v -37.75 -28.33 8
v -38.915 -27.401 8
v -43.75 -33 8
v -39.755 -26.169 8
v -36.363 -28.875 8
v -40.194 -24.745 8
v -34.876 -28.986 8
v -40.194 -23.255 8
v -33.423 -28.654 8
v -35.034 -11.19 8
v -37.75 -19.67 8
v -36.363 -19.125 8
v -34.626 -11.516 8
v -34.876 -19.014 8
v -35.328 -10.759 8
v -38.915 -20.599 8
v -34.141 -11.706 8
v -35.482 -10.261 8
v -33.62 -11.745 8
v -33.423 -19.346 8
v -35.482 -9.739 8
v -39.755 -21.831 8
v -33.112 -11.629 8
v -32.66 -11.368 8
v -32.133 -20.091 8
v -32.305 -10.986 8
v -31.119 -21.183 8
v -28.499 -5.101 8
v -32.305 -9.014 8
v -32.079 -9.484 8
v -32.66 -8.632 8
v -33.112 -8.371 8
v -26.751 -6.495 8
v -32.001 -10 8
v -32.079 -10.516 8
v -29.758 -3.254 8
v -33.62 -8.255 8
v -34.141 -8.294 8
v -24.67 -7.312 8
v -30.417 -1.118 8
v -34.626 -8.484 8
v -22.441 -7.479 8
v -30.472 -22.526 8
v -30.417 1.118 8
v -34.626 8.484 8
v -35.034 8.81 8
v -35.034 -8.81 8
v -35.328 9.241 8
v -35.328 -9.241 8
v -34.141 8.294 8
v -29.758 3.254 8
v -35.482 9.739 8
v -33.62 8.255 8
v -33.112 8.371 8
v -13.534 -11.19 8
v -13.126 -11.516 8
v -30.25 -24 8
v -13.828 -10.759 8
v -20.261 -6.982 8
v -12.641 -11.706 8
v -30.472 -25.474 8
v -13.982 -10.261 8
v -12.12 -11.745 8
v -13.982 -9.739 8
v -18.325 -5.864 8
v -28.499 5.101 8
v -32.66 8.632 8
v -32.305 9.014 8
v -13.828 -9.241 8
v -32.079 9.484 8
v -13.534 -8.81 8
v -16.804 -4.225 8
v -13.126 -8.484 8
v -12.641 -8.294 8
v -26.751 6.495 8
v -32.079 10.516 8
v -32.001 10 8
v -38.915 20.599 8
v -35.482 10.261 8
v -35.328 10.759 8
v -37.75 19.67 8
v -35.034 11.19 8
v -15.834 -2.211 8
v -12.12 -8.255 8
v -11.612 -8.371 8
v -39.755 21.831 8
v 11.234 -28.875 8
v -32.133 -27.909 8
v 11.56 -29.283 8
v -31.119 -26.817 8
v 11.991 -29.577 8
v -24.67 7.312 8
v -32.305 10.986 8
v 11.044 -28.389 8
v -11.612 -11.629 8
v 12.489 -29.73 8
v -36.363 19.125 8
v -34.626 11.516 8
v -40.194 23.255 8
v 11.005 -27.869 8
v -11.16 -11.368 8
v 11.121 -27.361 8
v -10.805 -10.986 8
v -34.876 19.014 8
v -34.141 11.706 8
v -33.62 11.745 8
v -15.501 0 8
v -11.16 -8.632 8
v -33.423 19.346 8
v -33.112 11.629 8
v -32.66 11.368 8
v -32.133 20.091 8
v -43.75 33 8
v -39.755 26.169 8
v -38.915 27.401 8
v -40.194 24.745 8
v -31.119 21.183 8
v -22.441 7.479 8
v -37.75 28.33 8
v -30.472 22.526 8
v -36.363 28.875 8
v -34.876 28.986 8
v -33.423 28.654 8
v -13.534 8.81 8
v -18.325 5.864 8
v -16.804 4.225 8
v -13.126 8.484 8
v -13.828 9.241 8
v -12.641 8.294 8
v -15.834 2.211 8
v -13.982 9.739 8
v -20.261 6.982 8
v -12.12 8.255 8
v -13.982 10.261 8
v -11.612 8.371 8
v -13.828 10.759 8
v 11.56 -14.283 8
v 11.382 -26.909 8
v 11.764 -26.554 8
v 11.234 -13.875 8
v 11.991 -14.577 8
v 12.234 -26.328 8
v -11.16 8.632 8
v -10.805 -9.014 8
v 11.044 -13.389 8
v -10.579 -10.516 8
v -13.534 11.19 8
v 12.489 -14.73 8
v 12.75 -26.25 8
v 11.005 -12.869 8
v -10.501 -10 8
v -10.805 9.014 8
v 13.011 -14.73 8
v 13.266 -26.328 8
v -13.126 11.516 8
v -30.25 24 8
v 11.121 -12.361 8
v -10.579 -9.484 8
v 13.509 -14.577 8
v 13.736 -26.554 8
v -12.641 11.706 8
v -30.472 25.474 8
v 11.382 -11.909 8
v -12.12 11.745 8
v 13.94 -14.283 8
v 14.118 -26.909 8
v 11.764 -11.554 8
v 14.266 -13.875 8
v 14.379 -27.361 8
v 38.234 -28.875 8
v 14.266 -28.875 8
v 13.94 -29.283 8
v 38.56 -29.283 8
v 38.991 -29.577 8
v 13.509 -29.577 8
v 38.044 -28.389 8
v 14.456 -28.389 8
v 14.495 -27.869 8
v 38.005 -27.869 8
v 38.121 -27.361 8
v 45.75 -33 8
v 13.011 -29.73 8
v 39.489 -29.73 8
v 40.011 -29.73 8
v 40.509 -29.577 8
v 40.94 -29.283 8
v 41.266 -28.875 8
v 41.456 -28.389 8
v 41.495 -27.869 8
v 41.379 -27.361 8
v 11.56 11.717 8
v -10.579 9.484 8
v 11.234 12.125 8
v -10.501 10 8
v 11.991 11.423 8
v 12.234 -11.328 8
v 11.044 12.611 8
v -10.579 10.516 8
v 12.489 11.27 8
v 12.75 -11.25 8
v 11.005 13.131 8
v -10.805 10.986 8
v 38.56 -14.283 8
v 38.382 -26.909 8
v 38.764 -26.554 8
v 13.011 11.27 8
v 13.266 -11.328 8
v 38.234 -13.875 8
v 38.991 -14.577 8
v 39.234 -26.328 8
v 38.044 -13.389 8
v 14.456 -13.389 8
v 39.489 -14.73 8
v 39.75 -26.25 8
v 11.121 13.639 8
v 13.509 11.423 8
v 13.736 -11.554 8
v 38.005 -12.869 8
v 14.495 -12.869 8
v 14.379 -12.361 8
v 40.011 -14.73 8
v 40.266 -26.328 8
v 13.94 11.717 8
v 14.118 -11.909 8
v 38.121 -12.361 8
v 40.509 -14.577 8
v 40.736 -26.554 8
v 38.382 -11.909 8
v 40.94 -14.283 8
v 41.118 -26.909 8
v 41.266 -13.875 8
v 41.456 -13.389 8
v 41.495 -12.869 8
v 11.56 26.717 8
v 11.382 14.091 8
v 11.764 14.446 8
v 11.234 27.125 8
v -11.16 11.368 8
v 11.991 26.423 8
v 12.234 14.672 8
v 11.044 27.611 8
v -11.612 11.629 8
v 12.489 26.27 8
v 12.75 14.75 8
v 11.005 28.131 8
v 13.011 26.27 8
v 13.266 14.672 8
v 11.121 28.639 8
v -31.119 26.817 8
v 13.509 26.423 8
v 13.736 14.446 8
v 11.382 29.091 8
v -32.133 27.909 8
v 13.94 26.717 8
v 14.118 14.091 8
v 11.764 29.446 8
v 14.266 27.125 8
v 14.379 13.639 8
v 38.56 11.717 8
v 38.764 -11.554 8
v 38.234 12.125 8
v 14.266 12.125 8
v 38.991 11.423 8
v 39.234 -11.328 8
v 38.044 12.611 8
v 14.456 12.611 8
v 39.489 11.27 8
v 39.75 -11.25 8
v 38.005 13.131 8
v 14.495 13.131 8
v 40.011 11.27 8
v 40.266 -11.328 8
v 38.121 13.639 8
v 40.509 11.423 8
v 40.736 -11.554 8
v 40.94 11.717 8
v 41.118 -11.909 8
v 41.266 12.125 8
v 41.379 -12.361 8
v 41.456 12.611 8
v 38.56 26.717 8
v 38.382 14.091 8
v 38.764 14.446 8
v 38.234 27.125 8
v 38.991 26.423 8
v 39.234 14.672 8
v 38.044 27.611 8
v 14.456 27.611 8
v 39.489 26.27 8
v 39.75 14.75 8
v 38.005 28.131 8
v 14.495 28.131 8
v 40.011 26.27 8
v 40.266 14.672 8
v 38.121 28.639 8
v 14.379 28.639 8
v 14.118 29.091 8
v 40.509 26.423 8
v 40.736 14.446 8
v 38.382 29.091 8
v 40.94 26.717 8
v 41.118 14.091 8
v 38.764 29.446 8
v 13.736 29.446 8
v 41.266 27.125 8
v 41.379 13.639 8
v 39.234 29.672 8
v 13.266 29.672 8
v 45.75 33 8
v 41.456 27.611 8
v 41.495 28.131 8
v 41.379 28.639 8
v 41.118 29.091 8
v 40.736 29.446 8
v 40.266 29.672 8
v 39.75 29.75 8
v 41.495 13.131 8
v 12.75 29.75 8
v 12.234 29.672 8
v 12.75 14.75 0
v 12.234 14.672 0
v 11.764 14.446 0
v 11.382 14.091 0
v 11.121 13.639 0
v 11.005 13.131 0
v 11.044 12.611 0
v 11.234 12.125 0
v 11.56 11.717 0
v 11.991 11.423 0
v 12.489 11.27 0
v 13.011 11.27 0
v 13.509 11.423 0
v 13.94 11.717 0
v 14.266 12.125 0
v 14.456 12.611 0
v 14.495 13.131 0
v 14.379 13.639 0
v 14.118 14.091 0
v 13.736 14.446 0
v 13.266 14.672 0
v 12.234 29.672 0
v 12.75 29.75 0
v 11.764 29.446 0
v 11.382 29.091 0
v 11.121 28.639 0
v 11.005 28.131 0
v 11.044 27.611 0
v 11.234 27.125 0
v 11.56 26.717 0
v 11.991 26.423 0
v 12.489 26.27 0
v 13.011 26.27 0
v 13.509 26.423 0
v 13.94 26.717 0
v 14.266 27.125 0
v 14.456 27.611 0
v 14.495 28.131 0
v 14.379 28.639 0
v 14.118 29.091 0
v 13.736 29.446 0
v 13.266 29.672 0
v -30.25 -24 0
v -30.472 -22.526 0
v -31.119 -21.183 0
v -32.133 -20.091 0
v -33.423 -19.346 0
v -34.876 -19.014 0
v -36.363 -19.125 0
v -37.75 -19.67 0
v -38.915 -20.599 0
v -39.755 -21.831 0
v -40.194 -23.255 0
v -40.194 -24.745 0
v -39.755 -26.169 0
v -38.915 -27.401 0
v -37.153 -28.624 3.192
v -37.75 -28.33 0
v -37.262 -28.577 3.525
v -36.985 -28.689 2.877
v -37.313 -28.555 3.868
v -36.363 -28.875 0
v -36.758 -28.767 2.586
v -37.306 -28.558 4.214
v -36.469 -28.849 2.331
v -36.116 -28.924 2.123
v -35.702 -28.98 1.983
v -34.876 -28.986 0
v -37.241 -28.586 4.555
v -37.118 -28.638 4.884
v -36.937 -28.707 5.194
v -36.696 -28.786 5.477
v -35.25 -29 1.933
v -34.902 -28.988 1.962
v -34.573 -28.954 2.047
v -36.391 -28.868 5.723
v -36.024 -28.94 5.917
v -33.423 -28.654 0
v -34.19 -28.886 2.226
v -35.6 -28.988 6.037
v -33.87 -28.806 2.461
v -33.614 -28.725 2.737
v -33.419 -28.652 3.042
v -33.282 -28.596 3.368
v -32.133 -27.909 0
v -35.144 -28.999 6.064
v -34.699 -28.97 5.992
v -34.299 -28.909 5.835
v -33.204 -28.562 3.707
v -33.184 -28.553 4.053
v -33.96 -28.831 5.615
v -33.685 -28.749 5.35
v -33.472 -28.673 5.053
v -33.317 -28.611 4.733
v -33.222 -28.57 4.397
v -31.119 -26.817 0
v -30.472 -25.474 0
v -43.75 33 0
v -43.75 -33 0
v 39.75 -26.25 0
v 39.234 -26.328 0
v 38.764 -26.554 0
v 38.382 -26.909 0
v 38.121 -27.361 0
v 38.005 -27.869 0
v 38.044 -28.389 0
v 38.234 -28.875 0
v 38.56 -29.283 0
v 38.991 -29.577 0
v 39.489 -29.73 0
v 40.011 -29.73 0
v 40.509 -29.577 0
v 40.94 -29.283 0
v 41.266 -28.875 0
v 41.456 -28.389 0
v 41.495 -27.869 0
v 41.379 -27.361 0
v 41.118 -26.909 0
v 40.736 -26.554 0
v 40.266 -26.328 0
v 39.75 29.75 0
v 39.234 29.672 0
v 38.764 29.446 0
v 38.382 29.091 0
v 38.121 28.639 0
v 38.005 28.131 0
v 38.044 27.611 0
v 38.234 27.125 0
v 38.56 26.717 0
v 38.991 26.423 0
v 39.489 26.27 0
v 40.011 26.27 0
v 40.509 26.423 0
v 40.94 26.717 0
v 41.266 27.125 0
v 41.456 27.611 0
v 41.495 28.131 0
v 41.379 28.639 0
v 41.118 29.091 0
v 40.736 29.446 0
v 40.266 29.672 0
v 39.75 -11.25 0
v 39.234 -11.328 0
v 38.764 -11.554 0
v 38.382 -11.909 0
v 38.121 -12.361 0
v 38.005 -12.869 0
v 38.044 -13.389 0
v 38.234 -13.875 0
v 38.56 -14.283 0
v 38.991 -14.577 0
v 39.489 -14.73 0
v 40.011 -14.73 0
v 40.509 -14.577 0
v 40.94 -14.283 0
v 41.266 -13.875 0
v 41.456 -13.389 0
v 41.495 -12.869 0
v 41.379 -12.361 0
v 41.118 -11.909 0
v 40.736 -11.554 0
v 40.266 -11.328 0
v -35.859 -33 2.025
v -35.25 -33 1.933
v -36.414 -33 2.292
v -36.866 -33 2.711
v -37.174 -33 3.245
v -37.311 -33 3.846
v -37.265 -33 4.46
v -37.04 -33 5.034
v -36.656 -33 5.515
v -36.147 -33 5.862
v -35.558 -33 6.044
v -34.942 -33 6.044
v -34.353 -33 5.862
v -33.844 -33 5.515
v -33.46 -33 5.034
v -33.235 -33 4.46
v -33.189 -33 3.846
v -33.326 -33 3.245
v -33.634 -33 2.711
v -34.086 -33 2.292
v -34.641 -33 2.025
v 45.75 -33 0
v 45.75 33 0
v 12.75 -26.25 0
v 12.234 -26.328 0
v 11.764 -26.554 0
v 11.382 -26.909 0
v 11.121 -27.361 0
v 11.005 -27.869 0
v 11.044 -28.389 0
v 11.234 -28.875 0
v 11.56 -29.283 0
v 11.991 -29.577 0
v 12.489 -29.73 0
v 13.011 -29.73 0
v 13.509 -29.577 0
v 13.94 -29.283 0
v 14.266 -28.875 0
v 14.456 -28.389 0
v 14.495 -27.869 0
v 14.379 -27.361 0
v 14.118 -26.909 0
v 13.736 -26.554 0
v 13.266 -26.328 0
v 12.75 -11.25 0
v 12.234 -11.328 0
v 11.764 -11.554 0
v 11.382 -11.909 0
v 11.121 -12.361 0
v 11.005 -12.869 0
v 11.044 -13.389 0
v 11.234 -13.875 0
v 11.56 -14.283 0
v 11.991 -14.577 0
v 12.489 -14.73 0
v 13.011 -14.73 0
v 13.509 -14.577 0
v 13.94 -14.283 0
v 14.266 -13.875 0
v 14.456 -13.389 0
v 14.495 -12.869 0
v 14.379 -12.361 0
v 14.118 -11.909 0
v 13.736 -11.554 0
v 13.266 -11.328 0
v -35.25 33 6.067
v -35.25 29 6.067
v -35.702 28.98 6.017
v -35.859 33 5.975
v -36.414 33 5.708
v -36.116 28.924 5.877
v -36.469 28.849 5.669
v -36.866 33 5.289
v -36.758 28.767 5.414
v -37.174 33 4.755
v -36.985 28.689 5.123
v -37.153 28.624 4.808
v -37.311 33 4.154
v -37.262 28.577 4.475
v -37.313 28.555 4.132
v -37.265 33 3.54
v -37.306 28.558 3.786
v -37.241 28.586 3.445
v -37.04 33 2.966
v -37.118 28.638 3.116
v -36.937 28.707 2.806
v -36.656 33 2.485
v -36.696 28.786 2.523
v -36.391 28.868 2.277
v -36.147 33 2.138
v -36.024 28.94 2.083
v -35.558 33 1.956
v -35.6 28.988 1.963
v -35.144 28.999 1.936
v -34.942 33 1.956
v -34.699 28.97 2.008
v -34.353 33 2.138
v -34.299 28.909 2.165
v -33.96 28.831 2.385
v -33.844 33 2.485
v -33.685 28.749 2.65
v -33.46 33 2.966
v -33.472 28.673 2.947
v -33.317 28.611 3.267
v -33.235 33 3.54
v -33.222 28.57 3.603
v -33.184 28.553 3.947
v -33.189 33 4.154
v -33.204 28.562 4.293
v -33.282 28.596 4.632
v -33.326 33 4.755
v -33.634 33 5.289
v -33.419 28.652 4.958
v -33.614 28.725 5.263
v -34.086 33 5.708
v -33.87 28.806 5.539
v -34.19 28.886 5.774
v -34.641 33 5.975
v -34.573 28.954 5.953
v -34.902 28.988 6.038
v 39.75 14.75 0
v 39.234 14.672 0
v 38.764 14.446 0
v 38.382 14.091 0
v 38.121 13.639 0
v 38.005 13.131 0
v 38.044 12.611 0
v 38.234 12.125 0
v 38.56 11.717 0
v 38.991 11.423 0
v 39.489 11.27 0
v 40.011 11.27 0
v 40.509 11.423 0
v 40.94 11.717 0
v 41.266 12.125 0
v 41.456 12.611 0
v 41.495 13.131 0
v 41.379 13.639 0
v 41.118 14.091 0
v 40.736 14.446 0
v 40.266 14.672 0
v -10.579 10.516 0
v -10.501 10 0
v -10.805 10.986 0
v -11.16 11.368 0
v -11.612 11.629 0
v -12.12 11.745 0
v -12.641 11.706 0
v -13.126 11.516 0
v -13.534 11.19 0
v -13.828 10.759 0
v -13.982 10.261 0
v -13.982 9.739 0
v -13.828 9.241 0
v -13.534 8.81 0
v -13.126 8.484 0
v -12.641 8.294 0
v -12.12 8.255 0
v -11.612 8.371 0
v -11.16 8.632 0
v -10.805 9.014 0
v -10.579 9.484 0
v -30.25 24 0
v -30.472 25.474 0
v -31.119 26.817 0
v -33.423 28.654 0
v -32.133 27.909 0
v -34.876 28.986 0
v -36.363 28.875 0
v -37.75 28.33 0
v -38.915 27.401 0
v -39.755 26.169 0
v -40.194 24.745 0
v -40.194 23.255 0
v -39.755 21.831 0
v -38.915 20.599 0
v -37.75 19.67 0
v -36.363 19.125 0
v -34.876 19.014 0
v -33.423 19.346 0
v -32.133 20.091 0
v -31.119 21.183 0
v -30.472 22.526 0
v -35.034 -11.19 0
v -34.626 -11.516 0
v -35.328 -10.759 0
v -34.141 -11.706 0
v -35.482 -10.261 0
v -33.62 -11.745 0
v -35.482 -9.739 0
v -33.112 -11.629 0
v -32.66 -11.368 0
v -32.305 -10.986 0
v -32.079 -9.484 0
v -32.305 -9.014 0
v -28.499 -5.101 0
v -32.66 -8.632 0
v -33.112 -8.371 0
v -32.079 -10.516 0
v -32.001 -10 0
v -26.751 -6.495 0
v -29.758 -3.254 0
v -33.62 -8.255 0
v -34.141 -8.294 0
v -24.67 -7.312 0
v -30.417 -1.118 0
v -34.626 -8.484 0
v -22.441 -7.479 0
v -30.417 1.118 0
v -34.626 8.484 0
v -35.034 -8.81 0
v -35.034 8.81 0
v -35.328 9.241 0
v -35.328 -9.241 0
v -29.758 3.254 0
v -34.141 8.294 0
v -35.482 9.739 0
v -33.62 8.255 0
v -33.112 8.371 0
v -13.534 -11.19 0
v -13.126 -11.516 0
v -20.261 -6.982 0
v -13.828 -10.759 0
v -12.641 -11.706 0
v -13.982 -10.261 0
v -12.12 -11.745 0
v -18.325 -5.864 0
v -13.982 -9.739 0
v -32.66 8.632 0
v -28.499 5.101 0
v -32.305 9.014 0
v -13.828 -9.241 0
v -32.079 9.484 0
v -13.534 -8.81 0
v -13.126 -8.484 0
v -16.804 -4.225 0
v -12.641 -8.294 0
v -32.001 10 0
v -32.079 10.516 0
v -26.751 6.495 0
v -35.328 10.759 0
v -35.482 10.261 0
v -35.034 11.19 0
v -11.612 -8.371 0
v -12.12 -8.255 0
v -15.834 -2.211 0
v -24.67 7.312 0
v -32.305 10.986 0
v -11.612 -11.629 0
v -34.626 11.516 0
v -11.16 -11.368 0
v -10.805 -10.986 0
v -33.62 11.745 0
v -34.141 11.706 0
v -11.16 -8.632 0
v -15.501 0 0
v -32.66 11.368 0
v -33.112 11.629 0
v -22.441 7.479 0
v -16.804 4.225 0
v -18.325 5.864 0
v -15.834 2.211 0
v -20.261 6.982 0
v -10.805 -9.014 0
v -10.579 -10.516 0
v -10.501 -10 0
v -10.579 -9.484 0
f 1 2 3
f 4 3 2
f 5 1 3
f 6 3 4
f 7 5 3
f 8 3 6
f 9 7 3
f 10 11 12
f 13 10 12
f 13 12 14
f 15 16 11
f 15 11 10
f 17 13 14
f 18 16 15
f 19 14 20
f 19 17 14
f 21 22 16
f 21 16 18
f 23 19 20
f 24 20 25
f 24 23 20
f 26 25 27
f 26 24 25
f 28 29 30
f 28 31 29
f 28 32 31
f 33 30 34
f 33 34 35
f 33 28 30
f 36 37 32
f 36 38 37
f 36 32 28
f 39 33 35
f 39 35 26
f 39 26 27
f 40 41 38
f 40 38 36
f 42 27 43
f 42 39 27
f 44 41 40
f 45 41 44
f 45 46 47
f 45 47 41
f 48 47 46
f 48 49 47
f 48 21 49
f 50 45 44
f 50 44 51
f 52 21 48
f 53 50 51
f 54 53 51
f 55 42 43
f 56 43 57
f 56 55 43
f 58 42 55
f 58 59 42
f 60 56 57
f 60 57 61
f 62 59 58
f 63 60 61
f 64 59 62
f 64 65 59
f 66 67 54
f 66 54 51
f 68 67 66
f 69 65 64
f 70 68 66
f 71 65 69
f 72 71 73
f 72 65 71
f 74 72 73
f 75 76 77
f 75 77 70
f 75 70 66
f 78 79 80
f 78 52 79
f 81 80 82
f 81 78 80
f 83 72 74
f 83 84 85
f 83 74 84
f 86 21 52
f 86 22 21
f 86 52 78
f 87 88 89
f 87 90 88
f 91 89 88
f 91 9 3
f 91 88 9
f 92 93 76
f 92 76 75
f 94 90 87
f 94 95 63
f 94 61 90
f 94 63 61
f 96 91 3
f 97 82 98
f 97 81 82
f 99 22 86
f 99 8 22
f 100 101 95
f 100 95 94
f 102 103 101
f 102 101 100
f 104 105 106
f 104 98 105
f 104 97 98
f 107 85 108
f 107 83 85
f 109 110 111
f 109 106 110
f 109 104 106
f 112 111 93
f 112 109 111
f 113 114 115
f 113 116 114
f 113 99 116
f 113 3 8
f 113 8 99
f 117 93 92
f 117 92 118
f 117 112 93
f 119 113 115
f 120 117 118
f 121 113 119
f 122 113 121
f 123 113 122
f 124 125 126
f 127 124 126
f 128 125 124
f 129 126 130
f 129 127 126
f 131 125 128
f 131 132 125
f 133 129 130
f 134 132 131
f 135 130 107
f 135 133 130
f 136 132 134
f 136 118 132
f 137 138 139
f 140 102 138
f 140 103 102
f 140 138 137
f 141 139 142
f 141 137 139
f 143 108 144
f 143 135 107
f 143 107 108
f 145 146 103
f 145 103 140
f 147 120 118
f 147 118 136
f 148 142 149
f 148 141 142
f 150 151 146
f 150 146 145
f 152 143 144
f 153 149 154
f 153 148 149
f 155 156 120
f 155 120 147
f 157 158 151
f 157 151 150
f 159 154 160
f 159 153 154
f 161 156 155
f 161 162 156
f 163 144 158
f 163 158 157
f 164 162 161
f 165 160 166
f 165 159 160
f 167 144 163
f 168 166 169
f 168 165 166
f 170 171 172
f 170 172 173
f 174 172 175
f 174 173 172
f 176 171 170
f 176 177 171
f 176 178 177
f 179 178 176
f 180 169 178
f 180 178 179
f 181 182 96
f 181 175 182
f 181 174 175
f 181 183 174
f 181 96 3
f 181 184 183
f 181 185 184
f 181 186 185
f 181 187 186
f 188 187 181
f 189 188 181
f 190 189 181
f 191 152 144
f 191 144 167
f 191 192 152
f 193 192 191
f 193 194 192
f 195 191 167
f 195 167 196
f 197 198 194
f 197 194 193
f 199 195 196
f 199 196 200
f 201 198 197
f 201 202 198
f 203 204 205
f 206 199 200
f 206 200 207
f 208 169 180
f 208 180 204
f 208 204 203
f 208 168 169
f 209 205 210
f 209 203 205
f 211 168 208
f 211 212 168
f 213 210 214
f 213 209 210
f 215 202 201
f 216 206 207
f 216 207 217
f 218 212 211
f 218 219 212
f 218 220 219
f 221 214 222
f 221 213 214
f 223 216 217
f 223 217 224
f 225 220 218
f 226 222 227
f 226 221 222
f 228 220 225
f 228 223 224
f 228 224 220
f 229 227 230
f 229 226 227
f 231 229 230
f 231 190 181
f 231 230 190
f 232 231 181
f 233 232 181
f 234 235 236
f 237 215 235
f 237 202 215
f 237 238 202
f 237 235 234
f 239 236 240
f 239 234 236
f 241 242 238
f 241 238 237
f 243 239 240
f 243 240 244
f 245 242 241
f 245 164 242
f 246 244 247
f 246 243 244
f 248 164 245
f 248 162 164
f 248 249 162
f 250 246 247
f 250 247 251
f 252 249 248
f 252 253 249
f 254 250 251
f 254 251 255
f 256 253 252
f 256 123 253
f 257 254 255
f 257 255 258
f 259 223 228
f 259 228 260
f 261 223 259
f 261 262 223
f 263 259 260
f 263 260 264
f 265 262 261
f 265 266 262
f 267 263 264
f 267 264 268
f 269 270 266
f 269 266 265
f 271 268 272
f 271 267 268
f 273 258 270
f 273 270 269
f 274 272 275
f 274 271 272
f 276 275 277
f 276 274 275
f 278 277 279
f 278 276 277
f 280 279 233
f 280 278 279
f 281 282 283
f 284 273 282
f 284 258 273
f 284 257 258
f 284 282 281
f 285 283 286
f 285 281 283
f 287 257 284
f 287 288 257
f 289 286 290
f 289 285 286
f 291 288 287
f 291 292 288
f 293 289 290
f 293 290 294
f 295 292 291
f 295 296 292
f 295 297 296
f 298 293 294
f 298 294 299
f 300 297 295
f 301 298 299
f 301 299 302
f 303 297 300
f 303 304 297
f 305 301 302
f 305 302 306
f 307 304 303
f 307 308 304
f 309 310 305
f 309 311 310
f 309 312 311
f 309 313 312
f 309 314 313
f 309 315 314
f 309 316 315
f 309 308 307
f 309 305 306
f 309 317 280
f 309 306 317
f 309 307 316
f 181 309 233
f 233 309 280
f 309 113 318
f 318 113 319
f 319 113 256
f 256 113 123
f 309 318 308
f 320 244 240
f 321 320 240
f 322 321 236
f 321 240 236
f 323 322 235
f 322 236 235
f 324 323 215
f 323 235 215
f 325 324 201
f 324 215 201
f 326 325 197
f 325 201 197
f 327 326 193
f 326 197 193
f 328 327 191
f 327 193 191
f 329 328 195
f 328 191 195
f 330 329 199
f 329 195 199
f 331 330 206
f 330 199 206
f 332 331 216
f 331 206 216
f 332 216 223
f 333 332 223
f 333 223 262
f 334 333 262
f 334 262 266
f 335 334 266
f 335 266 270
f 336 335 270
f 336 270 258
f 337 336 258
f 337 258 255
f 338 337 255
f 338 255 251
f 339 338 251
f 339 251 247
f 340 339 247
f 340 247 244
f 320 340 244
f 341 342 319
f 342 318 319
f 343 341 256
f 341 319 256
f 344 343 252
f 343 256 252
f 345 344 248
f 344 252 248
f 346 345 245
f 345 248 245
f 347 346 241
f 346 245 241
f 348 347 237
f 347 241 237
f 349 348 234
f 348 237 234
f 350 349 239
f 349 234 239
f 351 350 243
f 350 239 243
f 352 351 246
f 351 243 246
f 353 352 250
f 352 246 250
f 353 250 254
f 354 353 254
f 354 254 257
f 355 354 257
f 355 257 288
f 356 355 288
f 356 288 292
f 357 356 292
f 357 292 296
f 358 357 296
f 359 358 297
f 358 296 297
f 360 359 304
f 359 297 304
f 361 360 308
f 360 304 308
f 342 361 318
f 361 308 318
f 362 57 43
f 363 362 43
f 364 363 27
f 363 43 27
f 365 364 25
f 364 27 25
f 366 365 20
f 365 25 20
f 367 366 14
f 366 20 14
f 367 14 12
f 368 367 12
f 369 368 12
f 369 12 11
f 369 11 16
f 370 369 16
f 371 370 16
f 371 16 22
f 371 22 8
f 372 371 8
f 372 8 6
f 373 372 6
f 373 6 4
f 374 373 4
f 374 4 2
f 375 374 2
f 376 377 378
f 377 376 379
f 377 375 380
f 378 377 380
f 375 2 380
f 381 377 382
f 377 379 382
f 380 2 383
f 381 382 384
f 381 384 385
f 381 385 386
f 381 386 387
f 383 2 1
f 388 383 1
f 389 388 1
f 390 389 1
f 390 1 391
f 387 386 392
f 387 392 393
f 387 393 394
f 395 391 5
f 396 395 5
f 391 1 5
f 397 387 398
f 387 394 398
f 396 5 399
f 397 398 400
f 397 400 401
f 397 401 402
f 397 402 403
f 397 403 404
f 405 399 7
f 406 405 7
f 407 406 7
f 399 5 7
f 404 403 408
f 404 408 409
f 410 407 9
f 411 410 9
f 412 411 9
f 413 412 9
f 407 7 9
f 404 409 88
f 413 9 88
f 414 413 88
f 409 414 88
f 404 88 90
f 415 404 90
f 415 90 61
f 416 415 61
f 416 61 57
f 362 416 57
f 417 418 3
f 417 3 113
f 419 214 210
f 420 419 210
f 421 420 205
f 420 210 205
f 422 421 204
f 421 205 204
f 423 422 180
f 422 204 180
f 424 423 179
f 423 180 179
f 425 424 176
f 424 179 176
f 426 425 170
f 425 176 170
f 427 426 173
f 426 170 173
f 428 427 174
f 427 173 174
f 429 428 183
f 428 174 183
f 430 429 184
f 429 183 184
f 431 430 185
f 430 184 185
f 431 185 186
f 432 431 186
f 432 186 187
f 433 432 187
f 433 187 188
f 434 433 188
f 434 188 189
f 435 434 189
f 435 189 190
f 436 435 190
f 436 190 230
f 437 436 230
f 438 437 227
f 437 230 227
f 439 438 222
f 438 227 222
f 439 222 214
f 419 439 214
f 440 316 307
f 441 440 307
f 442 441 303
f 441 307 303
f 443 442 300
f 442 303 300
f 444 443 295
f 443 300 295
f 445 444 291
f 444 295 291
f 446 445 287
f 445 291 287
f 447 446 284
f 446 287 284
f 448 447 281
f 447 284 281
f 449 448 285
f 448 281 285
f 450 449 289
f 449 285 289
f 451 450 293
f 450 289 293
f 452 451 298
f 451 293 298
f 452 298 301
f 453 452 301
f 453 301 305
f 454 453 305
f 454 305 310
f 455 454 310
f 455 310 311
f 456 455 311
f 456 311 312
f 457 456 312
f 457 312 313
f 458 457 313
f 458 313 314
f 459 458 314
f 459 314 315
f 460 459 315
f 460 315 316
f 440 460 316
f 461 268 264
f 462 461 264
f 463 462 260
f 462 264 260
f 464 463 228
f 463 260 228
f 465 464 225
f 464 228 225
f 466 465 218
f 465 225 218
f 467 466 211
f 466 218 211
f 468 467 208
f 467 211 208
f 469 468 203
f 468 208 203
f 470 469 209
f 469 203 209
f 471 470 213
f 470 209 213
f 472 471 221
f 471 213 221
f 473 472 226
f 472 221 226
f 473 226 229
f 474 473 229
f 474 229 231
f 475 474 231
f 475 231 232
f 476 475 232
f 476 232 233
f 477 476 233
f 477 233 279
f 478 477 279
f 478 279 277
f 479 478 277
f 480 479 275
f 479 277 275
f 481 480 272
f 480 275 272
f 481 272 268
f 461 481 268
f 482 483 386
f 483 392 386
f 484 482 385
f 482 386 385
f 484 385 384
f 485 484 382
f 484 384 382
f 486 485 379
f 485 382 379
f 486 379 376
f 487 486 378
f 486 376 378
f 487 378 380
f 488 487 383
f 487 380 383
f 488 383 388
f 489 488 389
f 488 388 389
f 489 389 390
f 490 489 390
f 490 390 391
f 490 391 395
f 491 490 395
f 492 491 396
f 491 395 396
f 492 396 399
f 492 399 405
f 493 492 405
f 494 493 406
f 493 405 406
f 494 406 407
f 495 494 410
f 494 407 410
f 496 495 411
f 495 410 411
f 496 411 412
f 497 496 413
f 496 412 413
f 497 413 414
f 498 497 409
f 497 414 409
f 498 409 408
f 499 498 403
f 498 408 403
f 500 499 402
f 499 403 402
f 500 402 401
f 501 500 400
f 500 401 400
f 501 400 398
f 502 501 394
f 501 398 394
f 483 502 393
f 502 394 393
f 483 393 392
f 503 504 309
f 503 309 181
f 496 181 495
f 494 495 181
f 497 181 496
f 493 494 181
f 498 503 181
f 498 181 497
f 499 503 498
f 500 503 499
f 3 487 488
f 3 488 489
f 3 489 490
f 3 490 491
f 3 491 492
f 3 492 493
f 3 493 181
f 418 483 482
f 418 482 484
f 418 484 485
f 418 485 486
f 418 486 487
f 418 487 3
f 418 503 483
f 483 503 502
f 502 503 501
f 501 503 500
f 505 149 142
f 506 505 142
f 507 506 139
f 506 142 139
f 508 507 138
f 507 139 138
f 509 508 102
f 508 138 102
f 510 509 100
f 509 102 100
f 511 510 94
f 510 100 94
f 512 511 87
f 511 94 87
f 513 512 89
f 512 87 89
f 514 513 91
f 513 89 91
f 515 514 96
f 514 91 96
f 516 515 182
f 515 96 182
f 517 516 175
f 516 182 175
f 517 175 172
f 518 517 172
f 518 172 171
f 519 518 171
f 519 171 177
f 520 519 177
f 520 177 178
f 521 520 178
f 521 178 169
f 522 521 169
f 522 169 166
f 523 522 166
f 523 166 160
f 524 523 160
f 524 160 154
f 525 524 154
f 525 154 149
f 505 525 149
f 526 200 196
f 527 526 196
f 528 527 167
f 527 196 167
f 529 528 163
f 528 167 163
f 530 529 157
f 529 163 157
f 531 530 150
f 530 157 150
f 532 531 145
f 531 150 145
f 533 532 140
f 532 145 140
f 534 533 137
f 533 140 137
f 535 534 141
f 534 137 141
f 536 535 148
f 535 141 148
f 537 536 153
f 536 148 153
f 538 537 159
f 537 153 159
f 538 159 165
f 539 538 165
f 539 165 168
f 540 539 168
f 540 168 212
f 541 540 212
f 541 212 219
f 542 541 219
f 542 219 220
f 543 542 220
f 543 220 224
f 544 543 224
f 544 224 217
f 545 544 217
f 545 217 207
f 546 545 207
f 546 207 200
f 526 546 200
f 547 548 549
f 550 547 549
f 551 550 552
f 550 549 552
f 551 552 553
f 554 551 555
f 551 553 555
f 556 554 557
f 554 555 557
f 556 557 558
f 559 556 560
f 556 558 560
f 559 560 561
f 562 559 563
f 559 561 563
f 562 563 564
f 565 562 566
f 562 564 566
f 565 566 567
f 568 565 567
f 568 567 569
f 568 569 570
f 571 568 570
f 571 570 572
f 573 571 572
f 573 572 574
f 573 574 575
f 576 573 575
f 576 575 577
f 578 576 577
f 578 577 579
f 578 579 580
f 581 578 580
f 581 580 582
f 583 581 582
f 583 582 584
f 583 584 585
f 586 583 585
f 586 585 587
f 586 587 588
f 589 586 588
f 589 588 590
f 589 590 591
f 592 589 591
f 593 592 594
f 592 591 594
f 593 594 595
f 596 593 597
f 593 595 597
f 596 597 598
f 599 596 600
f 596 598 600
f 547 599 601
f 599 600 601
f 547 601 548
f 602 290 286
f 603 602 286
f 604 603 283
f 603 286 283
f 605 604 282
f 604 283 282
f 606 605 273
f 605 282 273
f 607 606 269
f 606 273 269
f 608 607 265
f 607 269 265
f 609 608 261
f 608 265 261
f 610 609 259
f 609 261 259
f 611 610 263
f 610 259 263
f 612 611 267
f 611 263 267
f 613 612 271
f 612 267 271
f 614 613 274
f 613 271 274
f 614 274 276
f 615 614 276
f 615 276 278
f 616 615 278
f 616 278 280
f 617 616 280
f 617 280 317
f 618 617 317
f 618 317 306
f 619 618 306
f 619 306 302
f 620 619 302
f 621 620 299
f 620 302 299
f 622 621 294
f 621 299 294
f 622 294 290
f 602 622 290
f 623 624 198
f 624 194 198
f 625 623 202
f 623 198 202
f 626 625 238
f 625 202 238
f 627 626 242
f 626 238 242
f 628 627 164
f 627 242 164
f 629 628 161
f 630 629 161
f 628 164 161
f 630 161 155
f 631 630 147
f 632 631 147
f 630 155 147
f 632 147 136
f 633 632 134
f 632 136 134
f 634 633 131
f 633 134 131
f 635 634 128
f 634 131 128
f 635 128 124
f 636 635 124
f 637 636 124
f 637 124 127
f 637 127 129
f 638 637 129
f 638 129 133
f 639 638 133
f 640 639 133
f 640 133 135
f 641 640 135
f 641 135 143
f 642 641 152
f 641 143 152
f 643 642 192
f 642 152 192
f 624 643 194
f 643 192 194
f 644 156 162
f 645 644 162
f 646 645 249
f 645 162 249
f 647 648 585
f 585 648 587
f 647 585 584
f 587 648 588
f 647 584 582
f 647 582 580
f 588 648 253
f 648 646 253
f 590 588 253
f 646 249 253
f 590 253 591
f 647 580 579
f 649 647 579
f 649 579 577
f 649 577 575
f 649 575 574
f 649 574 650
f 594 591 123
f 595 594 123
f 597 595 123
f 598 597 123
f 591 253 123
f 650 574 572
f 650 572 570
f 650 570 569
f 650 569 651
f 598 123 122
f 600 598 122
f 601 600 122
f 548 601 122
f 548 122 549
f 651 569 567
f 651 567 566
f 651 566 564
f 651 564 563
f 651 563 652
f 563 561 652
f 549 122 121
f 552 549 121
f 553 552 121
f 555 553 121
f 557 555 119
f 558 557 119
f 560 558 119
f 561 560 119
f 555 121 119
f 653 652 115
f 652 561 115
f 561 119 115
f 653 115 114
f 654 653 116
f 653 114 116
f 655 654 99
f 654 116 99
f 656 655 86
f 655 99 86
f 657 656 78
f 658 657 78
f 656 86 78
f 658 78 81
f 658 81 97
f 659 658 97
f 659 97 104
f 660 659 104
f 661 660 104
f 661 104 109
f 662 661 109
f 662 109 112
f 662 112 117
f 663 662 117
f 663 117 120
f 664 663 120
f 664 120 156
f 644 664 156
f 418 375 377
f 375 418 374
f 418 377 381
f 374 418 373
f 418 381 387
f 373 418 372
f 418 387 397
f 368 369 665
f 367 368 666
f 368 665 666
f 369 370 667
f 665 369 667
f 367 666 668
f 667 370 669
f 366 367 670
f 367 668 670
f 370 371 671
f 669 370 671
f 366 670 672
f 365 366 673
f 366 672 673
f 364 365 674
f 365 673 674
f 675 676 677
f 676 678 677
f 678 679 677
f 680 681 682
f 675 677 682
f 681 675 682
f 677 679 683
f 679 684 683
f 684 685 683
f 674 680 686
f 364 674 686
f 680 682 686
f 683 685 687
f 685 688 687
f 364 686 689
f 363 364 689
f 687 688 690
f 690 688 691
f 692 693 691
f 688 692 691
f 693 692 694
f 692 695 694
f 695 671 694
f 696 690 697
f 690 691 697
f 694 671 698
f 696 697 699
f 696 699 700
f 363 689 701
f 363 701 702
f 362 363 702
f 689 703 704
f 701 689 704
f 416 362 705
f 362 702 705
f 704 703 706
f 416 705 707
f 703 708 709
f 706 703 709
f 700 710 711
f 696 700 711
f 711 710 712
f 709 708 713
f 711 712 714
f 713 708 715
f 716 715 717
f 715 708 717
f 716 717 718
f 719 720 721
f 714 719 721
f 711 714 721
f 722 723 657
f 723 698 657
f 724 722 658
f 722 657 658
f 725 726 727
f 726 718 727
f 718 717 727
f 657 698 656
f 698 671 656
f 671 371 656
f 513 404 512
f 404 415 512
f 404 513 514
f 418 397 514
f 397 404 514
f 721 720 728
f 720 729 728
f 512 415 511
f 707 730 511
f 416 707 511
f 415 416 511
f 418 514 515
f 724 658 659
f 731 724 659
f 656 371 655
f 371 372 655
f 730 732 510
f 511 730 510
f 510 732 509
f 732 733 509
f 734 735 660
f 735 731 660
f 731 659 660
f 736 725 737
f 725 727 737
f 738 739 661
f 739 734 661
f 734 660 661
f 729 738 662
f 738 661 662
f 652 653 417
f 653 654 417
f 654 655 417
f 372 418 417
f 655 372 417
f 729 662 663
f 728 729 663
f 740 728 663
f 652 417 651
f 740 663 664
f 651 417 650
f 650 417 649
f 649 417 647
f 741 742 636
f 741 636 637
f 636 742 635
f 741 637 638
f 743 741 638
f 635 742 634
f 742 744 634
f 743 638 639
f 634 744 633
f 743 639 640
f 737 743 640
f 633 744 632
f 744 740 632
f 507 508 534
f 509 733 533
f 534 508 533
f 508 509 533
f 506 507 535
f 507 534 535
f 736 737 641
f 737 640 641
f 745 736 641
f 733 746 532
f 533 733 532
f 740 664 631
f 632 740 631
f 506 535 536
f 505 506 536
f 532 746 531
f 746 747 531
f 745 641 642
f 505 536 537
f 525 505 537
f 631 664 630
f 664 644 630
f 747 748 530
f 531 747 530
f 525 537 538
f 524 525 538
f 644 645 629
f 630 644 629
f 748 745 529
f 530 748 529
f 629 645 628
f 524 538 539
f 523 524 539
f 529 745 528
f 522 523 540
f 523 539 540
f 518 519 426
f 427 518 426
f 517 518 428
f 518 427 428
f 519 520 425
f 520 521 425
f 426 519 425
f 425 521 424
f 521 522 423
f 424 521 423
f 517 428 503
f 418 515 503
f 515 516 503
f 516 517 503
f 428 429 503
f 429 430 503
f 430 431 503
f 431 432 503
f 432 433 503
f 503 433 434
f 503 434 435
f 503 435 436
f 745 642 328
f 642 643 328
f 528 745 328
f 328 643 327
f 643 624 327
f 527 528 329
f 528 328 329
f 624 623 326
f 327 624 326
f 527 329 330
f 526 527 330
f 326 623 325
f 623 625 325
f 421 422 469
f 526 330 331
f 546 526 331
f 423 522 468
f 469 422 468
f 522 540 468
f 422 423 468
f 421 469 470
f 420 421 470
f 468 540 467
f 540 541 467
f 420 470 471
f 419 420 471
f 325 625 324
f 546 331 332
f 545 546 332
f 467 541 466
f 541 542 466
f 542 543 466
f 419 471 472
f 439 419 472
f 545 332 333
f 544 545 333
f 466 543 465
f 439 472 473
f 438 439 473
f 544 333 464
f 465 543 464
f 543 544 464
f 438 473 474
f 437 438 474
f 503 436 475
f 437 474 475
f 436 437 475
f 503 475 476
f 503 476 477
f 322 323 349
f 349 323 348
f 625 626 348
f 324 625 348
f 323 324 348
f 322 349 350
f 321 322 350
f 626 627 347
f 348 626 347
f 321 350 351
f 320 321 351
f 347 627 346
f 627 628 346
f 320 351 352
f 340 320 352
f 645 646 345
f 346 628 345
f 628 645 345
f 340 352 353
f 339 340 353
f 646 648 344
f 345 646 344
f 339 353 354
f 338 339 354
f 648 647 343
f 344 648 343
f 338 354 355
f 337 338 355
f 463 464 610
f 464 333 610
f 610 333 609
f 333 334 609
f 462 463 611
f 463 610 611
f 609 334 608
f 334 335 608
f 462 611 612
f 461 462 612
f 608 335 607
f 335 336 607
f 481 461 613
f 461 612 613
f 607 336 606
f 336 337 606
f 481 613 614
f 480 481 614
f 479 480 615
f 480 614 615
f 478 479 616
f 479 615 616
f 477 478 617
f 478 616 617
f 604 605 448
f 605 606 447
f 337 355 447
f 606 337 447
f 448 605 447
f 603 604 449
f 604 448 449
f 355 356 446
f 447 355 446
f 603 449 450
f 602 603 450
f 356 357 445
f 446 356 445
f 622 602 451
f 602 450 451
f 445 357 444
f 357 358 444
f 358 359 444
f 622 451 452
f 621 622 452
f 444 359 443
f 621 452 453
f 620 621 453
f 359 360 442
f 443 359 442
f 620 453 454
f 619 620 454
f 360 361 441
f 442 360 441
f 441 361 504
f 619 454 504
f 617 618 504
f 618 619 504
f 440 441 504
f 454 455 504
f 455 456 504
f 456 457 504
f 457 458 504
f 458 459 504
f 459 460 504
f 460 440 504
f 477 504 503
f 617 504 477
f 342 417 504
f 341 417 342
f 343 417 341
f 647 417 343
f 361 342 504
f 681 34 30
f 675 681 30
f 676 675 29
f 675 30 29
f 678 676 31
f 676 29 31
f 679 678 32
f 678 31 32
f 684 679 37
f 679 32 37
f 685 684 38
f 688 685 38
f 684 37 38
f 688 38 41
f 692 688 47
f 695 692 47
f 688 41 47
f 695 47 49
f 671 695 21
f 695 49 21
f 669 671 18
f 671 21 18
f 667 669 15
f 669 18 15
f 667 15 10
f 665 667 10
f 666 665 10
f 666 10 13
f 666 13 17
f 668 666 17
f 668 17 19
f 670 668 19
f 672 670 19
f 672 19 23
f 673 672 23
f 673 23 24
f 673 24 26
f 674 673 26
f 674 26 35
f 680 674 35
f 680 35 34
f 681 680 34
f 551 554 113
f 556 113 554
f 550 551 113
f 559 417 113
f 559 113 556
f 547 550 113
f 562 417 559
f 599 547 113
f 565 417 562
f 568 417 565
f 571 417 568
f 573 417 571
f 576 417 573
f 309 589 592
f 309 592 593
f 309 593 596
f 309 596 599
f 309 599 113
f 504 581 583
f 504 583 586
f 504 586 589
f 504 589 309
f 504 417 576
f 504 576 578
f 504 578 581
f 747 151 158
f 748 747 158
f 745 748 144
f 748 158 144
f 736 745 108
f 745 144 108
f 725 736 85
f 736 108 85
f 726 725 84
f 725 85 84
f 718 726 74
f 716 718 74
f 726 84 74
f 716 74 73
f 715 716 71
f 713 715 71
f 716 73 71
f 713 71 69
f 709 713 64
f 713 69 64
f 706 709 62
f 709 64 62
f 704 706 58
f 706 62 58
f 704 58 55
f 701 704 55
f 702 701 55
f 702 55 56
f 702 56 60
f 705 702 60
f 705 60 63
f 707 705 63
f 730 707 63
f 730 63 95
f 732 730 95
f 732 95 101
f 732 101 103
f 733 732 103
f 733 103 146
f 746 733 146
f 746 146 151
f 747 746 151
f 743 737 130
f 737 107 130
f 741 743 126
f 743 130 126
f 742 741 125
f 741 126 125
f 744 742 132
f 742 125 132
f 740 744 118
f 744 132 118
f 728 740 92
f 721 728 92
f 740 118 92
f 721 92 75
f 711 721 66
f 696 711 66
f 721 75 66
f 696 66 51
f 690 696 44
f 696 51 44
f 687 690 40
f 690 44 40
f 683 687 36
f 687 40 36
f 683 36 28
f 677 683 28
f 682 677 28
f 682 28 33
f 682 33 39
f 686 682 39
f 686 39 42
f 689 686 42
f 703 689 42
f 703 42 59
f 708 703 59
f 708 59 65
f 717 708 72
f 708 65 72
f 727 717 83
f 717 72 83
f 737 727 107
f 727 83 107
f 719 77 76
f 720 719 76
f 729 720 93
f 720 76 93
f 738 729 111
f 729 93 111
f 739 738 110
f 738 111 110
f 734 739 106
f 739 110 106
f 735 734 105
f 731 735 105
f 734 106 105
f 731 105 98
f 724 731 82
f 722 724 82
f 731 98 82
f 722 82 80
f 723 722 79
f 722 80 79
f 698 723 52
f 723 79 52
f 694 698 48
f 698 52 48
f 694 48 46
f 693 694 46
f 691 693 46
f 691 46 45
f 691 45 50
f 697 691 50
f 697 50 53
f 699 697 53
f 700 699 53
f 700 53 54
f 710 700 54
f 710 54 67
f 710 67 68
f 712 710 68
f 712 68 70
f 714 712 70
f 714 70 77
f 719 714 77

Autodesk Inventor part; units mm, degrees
ref_plane "YZ Plane" through (0, 0, 0) normal (1, 0, 0) x (0, 1, 0)
ref_plane "XZ Plane" through (0, 0, 0) normal (0, 1, 0) x (-1, 0, 0)
ref_plane "XY Plane" through (0, 0, 0) normal (0, 0, 1) x (1, 0, 0)
sketch "Sketch1" plane through (0, 0, 0) normal (0, 0, 1) x (1, 0, 0)
  line L0 (-43.75, 33) -> (43.75, 33)
  line L1 (43.75, 33) -> (43.75, -33)
  line L2 (43.75, -33) -> (-43.75, -33)
  line L3 (-43.75, -33) -> (-43.75, 33)
  point P0 (0, 0)
  point P1 (0, 33)
  point P2 (-43.75, 0)
  dimension "d0" = 87.5
  dimension "d1" = 66
extrude "Extrusion1" add sketch "Sketch1" along normal blind 8
sketch "Sketch4" plane through (0, 0, 8) normal (0, 0, 1) x (1, 0, 0)
  line L0 (43.75, 33) -> (-43.75, 33) projected
  line L1 (-43.75, 33) -> (-43.75, -33) projected
  circle A0 centre (-35.25, 24) radius 5
  circle A1 centre (-35.25, -24) radius 5
  line L2 (-43.75, -33) -> (43.75, -33) projected
  point P0 (0, 0)
  dimension "d27" = 8.5
  dimension "d28" = 9
  dimension "d29" = 10
  dimension "d30" = 9
extrude "Extrusion4" cut sketch "Sketch4" against normal through all
sketch "Sketch5" plane through (0, 0, 8) normal (0, 0, 1) x (1, 0, 0)
  circle A0 centre (-23.0012, 0) radius 4
  circle A1 centre (-23.0012, 0) radius 7.5
  line L0 (-43.75, 33) -> (-43.75, -33) projected
  line L1 (43.75, 33) -> (-43.75, 33) projected
  circle A2 centre (-23.0012, 0) radius 7 projected
  point P0 (0, 0)
  point P1 (-43.75, 0)
  dimension "d24" = 15
  dimension "d33" = 20.7488
extrude "Extrusion5" cut sketch "Sketch5" against normal through all contours A0 | A1 | A2
sketch "Sketch6" plane through (0, 0, 8) normal (0, 0, 1) x (1, 0, 0)
  circle A0 centre (-33.7512, 10) radius 1.75
  circle A1 centre (-12.2512, 10) radius 1.75
  circle A2 centre (-12.2512, -10) radius 1.75
  circle A3 centre (-33.7512, -10) radius 1.75
  line L0 (-33.7512, 10) -> (-12.2512, 10)
  line L1 (-12.2512, 10) -> (-12.2512, -10)
  line L2 (-12.2512, -10) -> (-33.7512, -10)
  line L3 (-33.7512, -10) -> (-33.7512, 10)
  line L4 (-33.7512, 10) -> (-12.2512, -10) construction
  line L5 (-12.2512, 10) -> (-33.7512, -10) construction
  circle A4 centre (-23.0012, 0) radius 7.5 projected
  line L6 (-43.75, 33) -> (-43.75, -33) projected
  point P0 (0, 0)
  point P1 (-23.0012, 0)
  dimension "d35" = 3.5
  dimension "d36" = 21.5
  dimension "d37" = 20
extrude "Extrusion6" cut sketch "Sketch6" against normal through all contours L0 L3 A0 | A0 L3 L0 | L0 L1 A1 | A1 L1 L0 | L3 L2 A3 | A3 L2 L3 | L1 L2 A2 | A2 L2 L1
sketch "Sketch7" plane through (0, 0, 8) normal (0, 0, 1) x (1, 0, 0)
  point P0 (0, 0)
sketch "Sketch8" plane through (0, 0, 0) normal (0, 0, -1) x (-1, 0, 0)
  line L0 (-35.75, -33) -> (-43.75, -33)
  line L1 (-43.75, -33) -> (-43.75, 33)
  line L2 (-43.75, 33) -> (-35.75, 33)
  line L3 (-35.75, 33) -> (-35.75, -33)
  line L4 (-8.75, -33) -> (-16.75, -33)
  line L5 (-16.75, -33) -> (-16.75, 33)
  line L6 (-16.75, 33) -> (-8.75, 33)
  line L7 (-8.75, 33) -> (-8.75, -33)
  line L8 (-44.55, -20.5) -> (-44.55, -29.5) projected
  point P0 (0, 0)
  point P1 (-39.75, -28)
  point P2 (-39.75, -13)
  point P3 (-39.75, 13)
  point P4 (-39.75, 28)
  dimension "d38" = 4
  dimension "d39" = 5
  dimension "d40" = 15
  dimension "d41" = 5
  dimension "d42" = 15
  dimension "d56" = 26
hole "Hole1" at (39.75, 28, 0) direction (0, 0, 1) diameter 3.5 end through all
move faces "Move1" translate (2, 0, 0) faces at (43.75, -11, 2.6667)
pattern_linear "Rectangular Pattern2" count 2 spacing 15 along (0, -1, 0) count 2 spacing 41 along (0, -1, 0) of "Hole1"
pattern_linear "Rectangular Pattern3" count 2 spacing 27 along (-1, 0, 0) of "Hole1", "Rectangular Pattern2"
sketch "Sketch10" plane through (-43.75, 33, 8) normal (0, 1, 0) x (1, 0, 0)
  line L0 (0, 8) -> (0, 0) projected
  point P0 (43.75, 8)
  point P1 (8.5, 4)
  point P2 (0, 4)
  dimension "d66" = 8.5
hole "Hole2" at (-35.25, 33, 4) direction (0, -1, 0) diameter 4.134 depth 7.45 tip angle 118 thread size "M5x0.8" class "6H" standard "ISO Metric profile"
sketch "Sketch11" plane through (-43.75, -33, 0) normal (0, -1, 0) x (1, 0, 0)
  line L0 (0, 0) -> (0, 8) projected
  point P0 (43.75, 0)
  point P1 (8.5, 4)
  point P2 (0, 4)
  dimension "d74" = 8.5
hole "Hole3" at (-35.25, -33, 4) direction (0, 1, 0) diameter 4.134 depth 7.45 tip angle 118 thread size "M5x0.8" class "6H" standard "ISO Metric profile"
equation "\"d30\" = d28"
equation "\"d41\" = d39"
equation "\"d42\" = d40"
properties part number "0005-10-011" material "Wood (Maple)"
